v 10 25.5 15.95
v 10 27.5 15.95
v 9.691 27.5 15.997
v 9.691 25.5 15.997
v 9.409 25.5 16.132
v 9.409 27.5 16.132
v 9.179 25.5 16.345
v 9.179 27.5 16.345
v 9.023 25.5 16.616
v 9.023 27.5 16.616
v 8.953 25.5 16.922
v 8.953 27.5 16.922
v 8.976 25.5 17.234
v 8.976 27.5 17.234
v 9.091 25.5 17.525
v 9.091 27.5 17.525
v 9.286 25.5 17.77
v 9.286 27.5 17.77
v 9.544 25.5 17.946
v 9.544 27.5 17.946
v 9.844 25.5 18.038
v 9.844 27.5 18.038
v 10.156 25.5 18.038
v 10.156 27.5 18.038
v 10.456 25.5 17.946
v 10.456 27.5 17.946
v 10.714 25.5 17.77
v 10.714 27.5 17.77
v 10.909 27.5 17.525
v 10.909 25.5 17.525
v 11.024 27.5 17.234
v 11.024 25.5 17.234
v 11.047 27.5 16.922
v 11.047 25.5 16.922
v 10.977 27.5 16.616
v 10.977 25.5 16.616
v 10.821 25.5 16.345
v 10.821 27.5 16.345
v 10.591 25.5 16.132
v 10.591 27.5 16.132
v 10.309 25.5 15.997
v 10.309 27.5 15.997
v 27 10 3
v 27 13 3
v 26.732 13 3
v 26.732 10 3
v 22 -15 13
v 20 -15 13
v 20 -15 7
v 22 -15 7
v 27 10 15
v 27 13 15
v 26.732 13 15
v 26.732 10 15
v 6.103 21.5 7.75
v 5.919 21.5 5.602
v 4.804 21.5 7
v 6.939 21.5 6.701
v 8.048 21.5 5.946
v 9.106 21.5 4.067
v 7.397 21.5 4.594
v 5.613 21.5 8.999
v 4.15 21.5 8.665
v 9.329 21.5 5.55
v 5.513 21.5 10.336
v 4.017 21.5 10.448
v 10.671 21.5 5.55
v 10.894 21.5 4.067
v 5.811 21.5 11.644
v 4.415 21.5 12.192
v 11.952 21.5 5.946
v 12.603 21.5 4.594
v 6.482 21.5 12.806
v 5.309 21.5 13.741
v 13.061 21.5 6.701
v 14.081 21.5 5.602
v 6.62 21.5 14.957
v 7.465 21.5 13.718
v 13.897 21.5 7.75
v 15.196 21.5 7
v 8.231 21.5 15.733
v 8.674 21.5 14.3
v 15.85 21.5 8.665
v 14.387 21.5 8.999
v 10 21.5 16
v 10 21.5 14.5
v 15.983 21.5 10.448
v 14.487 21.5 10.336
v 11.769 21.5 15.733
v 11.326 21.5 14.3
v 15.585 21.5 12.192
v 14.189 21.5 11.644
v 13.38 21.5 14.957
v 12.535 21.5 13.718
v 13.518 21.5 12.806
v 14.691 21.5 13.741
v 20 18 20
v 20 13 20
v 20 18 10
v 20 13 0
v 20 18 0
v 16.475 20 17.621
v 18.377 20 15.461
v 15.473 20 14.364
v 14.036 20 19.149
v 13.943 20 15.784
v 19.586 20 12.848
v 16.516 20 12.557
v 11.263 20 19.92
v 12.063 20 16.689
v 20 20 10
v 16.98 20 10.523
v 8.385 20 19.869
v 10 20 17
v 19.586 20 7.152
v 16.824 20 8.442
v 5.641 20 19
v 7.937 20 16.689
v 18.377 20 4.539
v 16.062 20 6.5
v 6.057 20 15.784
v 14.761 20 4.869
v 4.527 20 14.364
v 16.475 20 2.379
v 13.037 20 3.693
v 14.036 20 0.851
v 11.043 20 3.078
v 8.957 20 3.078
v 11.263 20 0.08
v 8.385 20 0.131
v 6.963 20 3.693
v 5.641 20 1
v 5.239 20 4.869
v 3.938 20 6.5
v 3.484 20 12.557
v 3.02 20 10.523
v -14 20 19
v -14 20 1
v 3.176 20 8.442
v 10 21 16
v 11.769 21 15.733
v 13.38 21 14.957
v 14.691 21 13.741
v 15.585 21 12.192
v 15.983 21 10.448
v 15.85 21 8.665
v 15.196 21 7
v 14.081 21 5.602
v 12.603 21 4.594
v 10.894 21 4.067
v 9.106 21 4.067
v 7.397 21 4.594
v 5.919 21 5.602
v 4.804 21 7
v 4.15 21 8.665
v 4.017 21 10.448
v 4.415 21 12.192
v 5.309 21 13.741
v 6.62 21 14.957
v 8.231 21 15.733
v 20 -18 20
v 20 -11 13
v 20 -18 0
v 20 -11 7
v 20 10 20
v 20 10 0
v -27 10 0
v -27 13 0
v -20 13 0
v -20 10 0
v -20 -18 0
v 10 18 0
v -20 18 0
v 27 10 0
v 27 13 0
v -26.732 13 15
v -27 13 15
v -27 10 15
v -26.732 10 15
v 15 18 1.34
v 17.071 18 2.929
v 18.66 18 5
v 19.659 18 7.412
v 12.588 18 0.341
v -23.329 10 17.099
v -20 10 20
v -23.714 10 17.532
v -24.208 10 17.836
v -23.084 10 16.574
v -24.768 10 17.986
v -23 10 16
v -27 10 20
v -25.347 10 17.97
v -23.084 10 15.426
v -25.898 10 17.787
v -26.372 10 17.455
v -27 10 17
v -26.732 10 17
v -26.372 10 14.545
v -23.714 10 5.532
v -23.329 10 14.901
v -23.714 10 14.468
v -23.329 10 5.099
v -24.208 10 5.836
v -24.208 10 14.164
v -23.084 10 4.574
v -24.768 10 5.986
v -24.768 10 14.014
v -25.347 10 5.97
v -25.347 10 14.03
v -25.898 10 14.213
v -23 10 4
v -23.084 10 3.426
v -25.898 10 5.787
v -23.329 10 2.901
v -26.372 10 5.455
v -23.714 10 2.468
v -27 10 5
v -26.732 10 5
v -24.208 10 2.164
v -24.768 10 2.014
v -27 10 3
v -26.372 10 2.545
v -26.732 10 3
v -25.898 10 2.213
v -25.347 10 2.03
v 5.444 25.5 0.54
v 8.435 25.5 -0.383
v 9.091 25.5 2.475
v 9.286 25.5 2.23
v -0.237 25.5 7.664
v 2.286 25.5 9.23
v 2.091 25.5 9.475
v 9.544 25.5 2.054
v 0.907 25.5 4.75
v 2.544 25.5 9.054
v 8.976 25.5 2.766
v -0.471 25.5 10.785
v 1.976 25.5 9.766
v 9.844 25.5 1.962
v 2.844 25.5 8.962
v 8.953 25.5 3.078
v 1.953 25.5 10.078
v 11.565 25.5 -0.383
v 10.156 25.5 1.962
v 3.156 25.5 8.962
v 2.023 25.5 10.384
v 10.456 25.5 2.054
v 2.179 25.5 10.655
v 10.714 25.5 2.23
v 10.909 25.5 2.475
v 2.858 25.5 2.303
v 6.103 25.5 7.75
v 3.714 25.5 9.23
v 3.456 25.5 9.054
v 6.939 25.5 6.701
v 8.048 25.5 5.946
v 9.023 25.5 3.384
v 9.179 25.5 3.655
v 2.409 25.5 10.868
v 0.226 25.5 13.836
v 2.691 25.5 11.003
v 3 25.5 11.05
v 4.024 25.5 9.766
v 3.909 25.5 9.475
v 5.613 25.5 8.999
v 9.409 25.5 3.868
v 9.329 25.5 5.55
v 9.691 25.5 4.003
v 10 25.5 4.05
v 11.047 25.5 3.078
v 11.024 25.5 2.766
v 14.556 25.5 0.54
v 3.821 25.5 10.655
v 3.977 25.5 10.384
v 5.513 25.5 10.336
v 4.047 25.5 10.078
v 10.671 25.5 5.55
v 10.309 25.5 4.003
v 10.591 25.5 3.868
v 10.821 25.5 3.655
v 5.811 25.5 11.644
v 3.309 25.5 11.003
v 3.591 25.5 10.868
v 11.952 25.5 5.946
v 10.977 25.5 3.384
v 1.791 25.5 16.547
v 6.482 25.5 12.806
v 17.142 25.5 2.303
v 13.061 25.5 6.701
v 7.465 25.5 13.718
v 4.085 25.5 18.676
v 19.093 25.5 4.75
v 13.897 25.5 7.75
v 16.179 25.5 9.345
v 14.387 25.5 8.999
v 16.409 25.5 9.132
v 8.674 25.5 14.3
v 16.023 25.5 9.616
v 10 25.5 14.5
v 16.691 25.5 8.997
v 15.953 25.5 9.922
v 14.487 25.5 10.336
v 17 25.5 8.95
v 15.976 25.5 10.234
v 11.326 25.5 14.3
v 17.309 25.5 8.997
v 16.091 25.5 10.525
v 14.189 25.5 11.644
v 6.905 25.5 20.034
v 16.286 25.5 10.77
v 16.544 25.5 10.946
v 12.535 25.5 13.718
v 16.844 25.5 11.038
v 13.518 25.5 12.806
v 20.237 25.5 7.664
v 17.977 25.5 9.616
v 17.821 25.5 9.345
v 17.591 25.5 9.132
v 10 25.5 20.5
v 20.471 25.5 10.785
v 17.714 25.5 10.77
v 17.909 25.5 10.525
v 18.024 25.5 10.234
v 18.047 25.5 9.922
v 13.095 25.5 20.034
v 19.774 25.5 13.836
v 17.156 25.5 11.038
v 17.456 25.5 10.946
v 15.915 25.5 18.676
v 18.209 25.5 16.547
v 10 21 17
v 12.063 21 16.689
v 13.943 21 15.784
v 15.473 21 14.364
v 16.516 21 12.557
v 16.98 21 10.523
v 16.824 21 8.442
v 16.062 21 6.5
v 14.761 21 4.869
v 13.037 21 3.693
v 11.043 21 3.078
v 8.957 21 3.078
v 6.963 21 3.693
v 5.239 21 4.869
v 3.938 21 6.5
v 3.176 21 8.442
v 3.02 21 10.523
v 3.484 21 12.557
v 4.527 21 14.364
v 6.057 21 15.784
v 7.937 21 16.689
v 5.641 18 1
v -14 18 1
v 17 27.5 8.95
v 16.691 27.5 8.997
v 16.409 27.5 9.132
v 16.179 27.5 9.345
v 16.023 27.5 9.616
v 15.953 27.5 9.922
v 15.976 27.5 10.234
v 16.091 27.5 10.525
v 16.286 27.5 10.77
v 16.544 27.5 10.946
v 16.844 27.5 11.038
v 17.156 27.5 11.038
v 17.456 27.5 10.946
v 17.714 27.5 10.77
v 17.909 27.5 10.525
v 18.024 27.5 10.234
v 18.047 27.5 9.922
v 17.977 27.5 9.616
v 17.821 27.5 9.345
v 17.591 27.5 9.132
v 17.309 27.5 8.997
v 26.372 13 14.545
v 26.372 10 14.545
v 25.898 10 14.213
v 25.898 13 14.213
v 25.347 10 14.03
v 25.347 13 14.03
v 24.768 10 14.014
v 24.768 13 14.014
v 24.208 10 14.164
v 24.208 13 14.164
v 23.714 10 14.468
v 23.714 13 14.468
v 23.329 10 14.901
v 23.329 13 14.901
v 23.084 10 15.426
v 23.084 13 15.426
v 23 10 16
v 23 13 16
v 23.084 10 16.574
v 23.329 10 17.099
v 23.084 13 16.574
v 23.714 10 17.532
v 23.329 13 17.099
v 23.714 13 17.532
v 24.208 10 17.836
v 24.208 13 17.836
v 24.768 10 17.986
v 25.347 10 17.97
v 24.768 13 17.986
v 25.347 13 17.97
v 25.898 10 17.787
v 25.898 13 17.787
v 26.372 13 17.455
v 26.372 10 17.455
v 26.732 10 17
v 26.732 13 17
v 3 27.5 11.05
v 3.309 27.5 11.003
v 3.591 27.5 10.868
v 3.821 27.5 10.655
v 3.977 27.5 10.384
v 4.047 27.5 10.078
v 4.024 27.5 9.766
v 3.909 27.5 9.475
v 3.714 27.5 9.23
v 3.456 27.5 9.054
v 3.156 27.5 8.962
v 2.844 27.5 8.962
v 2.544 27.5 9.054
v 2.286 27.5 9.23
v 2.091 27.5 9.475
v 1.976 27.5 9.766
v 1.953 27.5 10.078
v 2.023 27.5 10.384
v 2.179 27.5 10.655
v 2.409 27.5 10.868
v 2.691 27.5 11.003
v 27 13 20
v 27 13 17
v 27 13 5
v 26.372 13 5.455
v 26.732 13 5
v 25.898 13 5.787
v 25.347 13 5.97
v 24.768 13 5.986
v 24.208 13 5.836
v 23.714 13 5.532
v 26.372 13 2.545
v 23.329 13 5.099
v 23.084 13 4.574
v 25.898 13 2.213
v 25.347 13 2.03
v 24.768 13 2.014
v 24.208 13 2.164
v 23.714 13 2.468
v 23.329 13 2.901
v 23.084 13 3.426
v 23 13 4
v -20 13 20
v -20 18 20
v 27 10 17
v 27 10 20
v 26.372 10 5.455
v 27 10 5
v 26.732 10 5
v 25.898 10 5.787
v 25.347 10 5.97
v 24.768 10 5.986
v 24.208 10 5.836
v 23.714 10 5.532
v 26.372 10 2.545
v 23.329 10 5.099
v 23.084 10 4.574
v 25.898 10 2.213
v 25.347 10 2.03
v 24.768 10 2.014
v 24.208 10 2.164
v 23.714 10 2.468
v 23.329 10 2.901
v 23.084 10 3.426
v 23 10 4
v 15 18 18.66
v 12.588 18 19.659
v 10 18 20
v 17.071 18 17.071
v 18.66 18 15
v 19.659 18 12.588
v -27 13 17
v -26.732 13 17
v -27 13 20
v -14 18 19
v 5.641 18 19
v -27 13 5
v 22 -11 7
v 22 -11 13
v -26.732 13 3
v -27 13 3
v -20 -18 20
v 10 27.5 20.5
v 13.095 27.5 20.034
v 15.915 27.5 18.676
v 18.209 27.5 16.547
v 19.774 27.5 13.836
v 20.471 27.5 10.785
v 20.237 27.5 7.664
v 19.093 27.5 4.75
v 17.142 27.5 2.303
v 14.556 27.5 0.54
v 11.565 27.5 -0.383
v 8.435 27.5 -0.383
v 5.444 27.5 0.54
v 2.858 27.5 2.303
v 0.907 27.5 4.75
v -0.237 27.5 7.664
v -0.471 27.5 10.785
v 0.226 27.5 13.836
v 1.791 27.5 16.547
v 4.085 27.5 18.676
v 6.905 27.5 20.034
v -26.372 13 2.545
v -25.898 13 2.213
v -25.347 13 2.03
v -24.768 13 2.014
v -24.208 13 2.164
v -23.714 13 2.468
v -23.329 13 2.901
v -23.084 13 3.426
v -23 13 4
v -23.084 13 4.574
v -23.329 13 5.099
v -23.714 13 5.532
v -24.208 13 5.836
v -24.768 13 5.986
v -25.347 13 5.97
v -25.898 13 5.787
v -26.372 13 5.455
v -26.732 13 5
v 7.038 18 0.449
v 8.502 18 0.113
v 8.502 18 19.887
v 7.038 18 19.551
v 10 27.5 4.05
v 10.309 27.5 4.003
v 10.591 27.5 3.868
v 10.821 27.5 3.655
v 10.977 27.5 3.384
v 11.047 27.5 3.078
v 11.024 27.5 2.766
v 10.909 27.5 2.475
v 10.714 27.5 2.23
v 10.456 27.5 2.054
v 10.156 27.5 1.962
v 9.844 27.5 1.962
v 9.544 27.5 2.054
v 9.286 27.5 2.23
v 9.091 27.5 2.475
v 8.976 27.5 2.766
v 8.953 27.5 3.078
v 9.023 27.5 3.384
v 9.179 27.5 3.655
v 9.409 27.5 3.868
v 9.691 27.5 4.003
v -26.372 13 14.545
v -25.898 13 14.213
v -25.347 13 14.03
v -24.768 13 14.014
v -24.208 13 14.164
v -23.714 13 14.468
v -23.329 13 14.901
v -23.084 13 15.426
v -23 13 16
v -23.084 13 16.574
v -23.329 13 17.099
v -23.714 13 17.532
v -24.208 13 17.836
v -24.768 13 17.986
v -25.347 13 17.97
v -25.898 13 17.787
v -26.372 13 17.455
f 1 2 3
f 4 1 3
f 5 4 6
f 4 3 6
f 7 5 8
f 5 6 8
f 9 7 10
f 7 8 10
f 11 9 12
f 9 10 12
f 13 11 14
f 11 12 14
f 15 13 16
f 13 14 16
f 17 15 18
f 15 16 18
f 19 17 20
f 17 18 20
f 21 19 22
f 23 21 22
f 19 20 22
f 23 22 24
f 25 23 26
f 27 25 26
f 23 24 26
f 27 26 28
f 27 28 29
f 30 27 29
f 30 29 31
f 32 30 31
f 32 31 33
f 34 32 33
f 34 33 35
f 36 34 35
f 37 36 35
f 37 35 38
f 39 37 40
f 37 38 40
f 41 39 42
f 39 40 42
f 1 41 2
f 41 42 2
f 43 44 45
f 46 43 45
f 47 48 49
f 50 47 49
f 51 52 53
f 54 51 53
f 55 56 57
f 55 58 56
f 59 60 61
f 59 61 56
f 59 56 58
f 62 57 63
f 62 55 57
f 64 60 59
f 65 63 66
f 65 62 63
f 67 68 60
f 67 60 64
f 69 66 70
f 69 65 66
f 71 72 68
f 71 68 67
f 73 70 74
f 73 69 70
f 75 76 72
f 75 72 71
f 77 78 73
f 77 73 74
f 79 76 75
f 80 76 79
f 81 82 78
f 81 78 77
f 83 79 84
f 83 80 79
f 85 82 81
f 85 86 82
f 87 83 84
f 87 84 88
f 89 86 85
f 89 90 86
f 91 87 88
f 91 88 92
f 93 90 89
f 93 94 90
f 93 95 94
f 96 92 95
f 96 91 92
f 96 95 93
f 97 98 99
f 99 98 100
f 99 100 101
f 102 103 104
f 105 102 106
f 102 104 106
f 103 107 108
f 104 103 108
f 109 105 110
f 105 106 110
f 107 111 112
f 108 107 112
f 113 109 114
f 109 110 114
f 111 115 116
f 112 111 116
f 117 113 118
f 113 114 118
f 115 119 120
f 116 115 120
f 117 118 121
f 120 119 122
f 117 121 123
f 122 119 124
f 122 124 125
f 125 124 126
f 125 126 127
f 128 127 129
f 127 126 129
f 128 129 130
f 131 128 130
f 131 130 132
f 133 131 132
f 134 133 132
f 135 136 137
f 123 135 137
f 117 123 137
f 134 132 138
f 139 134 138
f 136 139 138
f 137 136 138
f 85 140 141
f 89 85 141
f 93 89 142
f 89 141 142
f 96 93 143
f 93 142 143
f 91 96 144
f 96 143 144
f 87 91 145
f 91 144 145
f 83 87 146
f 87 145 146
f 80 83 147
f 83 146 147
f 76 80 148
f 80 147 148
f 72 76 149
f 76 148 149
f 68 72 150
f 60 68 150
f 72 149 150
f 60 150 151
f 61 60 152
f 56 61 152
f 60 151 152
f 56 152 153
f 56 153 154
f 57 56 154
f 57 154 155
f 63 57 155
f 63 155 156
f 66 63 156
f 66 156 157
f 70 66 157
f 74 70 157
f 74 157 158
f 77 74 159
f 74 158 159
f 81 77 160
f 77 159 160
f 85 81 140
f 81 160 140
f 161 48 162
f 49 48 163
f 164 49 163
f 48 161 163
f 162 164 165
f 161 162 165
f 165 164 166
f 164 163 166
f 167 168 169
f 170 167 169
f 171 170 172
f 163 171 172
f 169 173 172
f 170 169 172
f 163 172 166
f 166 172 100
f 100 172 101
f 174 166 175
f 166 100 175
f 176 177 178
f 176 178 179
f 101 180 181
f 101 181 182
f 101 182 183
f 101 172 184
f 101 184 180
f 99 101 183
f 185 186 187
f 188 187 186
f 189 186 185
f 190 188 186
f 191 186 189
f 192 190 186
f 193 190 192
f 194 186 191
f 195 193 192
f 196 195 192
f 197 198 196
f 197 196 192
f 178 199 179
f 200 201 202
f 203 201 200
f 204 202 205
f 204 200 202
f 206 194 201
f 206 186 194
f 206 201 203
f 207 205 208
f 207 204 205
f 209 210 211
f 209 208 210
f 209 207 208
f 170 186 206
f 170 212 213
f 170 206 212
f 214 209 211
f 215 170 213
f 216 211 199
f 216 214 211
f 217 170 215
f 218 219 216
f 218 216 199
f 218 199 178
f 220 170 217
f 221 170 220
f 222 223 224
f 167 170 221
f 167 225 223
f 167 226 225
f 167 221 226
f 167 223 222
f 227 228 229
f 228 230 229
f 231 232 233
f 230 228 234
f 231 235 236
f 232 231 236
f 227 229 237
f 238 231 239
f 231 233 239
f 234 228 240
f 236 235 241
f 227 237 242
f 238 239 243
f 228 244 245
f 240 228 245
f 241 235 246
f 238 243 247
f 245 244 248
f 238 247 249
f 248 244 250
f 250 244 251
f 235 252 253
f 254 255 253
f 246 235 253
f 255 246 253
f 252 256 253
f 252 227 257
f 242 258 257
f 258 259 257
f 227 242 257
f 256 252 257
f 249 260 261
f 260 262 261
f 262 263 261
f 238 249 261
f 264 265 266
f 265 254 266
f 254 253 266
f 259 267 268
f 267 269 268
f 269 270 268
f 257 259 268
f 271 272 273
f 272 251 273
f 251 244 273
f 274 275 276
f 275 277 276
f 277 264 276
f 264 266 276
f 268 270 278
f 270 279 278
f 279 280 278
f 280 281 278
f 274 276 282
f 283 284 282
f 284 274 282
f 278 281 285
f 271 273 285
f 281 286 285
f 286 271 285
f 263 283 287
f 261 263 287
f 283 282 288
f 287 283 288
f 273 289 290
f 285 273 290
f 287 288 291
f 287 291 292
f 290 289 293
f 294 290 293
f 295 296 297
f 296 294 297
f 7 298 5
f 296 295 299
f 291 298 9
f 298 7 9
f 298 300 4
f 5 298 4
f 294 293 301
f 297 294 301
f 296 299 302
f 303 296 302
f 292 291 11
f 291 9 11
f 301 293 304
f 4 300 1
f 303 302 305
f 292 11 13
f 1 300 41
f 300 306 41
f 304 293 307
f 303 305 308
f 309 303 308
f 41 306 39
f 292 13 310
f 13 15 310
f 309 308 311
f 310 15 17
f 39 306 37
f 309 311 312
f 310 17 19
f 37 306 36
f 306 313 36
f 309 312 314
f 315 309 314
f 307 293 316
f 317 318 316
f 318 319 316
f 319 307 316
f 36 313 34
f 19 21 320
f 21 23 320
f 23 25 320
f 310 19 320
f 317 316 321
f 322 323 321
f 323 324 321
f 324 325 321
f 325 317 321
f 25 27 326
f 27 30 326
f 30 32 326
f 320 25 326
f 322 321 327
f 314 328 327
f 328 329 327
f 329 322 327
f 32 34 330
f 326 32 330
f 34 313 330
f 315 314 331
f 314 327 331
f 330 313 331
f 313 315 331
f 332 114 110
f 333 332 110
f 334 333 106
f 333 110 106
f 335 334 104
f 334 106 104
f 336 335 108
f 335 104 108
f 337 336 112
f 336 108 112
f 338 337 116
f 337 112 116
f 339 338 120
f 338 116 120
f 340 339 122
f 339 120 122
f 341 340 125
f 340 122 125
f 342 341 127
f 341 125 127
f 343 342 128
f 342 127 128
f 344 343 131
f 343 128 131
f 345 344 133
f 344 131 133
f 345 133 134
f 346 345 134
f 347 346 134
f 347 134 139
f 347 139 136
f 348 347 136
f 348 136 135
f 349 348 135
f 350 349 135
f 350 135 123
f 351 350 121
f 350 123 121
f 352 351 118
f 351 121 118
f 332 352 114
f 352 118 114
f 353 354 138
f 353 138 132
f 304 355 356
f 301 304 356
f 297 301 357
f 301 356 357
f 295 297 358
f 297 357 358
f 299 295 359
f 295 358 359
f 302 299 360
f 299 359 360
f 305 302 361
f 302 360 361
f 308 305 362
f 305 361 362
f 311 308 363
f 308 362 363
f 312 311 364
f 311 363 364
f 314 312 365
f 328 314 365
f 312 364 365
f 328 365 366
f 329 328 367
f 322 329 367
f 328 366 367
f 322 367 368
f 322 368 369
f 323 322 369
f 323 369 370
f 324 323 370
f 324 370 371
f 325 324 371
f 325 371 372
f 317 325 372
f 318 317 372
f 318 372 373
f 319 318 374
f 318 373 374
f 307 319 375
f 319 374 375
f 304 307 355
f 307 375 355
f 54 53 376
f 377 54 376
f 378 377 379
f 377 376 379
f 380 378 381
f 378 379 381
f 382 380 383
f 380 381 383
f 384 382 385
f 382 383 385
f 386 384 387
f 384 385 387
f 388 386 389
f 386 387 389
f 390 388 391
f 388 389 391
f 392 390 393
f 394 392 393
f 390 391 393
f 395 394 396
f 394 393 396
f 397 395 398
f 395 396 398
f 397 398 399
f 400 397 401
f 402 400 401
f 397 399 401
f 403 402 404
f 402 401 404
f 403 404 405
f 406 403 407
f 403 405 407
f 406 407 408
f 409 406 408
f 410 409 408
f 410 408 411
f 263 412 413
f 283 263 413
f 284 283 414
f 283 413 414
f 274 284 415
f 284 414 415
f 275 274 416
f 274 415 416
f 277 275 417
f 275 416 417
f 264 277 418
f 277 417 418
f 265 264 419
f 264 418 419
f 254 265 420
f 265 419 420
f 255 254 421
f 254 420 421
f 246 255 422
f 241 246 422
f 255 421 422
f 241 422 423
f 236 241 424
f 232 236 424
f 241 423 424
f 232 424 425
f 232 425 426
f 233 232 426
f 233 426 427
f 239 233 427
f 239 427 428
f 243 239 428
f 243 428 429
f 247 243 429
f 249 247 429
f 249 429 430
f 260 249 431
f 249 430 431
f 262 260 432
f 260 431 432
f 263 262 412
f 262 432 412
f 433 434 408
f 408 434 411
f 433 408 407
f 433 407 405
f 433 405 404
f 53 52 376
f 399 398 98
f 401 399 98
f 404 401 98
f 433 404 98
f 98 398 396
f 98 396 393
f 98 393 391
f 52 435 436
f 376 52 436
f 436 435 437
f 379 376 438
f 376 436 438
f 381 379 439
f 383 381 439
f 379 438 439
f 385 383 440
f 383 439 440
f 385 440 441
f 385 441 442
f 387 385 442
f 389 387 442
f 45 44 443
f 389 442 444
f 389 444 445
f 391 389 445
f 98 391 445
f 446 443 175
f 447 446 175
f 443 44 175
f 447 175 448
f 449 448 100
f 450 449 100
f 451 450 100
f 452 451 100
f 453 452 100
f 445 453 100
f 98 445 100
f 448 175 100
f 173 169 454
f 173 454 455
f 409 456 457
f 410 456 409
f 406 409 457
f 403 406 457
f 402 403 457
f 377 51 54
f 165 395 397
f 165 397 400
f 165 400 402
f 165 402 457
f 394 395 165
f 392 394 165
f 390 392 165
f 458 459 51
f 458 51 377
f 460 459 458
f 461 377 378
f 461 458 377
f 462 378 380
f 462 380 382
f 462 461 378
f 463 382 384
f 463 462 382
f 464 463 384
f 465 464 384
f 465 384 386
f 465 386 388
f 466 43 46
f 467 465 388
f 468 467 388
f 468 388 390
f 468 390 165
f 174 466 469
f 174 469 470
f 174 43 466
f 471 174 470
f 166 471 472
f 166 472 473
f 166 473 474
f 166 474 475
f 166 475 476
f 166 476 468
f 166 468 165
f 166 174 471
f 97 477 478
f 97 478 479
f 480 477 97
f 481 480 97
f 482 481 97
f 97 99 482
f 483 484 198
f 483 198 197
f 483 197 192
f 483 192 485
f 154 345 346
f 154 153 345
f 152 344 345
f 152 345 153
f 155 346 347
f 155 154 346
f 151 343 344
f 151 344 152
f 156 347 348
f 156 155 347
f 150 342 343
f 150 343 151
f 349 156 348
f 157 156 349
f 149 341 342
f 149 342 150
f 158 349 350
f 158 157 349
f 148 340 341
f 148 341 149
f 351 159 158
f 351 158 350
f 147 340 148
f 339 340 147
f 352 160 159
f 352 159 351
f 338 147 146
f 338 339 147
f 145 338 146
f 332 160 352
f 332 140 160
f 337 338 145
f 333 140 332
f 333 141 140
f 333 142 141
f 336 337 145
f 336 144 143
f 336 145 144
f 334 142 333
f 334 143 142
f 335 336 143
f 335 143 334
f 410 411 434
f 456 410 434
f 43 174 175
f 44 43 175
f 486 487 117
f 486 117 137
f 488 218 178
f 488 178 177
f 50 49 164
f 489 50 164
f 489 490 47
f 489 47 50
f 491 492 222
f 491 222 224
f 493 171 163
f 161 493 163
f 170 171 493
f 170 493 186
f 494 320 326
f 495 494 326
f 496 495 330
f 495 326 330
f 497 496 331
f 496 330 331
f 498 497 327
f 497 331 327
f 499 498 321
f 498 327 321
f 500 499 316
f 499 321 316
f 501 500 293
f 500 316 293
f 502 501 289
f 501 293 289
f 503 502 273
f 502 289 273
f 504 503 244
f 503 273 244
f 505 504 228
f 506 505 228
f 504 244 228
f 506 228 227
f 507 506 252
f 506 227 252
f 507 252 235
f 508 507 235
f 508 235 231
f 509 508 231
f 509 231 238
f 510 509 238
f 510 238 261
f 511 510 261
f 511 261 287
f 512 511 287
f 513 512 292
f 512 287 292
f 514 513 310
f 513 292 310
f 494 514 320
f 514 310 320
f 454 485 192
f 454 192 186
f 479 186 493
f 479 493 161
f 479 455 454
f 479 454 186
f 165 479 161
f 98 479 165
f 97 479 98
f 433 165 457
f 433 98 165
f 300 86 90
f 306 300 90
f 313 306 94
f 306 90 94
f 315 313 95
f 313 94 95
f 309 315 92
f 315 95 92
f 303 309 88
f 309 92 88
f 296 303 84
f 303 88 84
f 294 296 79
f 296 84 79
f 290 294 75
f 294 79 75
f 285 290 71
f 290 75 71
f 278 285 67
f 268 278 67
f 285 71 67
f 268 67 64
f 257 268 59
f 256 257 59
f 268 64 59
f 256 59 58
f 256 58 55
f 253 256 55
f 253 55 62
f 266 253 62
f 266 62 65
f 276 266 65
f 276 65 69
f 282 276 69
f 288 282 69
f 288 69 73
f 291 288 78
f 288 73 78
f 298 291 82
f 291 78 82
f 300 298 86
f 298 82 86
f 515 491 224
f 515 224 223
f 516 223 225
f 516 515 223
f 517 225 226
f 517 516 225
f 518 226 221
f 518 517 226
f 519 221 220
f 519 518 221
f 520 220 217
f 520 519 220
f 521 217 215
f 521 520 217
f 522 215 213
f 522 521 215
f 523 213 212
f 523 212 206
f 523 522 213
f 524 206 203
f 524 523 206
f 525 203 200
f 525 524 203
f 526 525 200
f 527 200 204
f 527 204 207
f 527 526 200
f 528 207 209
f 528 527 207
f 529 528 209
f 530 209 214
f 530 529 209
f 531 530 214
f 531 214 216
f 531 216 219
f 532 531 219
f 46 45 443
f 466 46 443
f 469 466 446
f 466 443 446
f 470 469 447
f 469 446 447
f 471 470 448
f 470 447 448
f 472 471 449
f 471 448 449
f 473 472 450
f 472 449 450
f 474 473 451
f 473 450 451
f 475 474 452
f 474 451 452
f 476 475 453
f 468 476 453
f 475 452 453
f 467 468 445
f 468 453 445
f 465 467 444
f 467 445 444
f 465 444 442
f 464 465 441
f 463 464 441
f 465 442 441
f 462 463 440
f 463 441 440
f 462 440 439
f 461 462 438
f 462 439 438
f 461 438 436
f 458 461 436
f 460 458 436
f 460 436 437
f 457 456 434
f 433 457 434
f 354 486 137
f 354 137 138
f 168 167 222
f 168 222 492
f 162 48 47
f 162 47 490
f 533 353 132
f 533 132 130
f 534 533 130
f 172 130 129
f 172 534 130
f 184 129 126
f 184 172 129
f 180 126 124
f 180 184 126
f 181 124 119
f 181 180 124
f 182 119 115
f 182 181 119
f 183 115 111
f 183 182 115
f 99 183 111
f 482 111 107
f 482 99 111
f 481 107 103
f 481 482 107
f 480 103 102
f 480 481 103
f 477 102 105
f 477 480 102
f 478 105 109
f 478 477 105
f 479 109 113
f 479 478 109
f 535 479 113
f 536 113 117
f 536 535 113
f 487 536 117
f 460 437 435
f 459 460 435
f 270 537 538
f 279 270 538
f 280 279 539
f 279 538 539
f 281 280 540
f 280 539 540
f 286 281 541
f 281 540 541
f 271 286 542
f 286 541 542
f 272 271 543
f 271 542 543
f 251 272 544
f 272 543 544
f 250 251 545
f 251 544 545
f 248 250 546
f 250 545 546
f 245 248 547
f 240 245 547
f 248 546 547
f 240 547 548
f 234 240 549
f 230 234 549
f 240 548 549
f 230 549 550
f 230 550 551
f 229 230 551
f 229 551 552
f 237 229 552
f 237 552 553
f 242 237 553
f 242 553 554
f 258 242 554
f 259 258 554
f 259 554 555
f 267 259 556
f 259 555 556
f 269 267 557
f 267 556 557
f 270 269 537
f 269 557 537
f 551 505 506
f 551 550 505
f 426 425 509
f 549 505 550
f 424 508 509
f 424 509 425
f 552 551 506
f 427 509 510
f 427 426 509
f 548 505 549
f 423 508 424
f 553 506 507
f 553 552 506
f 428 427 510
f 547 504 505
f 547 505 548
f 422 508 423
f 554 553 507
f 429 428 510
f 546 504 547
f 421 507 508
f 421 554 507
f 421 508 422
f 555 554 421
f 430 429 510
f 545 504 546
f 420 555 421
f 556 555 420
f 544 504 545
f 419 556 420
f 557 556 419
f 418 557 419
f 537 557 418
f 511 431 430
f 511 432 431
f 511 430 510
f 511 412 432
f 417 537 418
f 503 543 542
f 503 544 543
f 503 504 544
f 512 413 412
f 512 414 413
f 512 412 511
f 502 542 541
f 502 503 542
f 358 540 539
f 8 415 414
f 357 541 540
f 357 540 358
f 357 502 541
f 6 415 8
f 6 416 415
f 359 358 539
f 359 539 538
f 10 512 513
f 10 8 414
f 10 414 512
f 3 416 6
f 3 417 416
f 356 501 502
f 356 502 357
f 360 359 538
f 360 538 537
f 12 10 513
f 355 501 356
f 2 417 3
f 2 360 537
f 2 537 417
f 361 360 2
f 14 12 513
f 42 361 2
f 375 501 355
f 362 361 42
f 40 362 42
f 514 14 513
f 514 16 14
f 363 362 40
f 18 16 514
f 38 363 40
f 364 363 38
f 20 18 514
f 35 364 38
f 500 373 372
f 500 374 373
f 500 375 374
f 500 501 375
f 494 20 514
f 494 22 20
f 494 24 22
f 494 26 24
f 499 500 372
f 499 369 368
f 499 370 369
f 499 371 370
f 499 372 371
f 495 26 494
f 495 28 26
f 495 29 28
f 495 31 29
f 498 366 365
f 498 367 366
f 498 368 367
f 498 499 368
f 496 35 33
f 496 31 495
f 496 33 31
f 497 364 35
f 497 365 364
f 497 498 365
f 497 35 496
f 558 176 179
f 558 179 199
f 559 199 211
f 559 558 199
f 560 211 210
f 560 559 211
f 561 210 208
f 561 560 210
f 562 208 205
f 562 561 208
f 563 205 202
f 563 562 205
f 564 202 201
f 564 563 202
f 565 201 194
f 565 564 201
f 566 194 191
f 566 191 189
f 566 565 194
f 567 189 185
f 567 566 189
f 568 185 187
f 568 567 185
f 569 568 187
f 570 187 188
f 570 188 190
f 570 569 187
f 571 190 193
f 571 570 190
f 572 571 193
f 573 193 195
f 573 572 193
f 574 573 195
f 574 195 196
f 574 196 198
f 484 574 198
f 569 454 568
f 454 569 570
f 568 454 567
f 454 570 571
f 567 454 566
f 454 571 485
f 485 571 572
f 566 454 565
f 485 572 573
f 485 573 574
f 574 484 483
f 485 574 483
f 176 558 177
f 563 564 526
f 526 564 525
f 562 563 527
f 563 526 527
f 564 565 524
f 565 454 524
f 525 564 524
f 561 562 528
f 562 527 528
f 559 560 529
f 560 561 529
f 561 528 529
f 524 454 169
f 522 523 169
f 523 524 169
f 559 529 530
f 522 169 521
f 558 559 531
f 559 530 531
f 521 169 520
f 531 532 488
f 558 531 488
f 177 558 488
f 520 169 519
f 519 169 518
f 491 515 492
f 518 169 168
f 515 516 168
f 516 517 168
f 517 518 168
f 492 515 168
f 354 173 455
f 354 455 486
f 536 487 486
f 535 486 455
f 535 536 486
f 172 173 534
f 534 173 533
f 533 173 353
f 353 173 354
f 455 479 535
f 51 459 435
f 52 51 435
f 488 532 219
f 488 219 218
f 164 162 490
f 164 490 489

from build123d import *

# Parameters (mm, degrees)
SKETCH1_W           = 40
SKETCH1_H           = 36
BOSS_EXTRUDE1_DEPTH = 20
BOSS_EXTRUDE3_DEPTH = 2
SKETCH4_R           = 7
BOSS_EXTRUDE4_DEPTH = 1
SKETCH5_R           = 6
BOSS_EXTRUDE5_DEPTH = 0.5
SKETCH8_R           = 4.5
BOSS_EXTRUDE6_DEPTH = 4
SKETCH9_R           = 10.5
BOSS_EXTRUDE7_DEPTH = 2
SKETCH13_W          = 7
SKETCH13_H          = 3
BOSS_EXTRUDE8_DEPTH = 20
CUT_EXTRUDE1_DEPTH  = 3
SKETCH17_W          = 6
SKETCH17_H          = 4
BOSS_EXTRUDE9_DEPTH = 2
SKETCH19_R          = 1.05
CUT_EXTRUDE2_DEPTH  = 2


with BuildPart() as part:
    # Sketch1 → Boss-Extrude1 (new body)
    with BuildSketch(Plane.XY):
        Rectangle(SKETCH1_W, SKETCH1_H)
    extrude(amount=BOSS_EXTRUDE1_DEPTH)

    # Sketch2 → Boss-Extrude3 (add)
    with BuildSketch(Plane(origin=(0, 18, 0), x_dir=(1, 0, 0), z_dir=(0, 1, 0))):
        with BuildLine():
            Line((-14, -1), (5.641101056, -1))
            ThreePointArc((5.641101056, -1), (20, -10), (5.641101056, -19))
            Line((5.641101056, -19), (-14, -19))
            Line((-14, -19), (-14, -1))
        make_face()
    extrude(amount=BOSS_EXTRUDE3_DEPTH)

    # Sketch4 → Boss-Extrude4 (add)
    with BuildSketch(Plane(origin=(0, 20, 0), x_dir=(1, 0, 0), z_dir=(0, 1, 0))):
        with Locations(Location((10, -10, 0), (0, 0, 270))):
            Circle(SKETCH4_R)
    extrude(amount=BOSS_EXTRUDE4_DEPTH)

    # Sketch5 → Boss-Extrude5 (add)
    with BuildSketch(Plane(origin=(0, 21, 0), x_dir=(1, 0, 0), z_dir=(0, 1, 0))):
        with Locations(Location((10, -10, 0), (0, 0, 270))):
            Circle(SKETCH5_R)
    extrude(amount=BOSS_EXTRUDE5_DEPTH)

    # Sketch8 → Boss-Extrude6 (add)
    with BuildSketch(Plane(origin=(0, 21.5, 0), x_dir=(1, 0, 0), z_dir=(0, 1, 0))):
        with Locations(Location((10, -10, 0), (0, 0, 270))):
            Circle(SKETCH8_R)
    extrude(amount=BOSS_EXTRUDE6_DEPTH)

    # Sketch9 → Boss-Extrude7 (add)
    with BuildSketch(Plane(origin=(0, 25.5, 0), x_dir=(1, 0, 0), z_dir=(0, 1, 0))):
        with Locations(Location((10, -10, 0), (0, 0, 270))):
            Circle(SKETCH9_R)
    extrude(amount=BOSS_EXTRUDE7_DEPTH)

    # Sketch13 → Boss-Extrude8 (add)
    with BuildSketch(Plane(origin=(0, 0, 0), x_dir=(-1, 0, 0), z_dir=(0, 0, -1))):
        with Locations((23.5, 11.5)):
            Rectangle(SKETCH13_W, SKETCH13_H)
        with Locations((-23.5, 11.5)):
            Rectangle(SKETCH13_W, SKETCH13_H)
    extrude(amount=-BOSS_EXTRUDE8_DEPTH)

    # Sketch14 → Cut-Extrude1 (cut)
    with BuildSketch(Plane(origin=(0, 13, 0), x_dir=(1, 0, 0), z_dir=(0, 1, 0))):
        with BuildLine():
            Line((-27, -17), (-27, -15))
            Line((-27, -15), (-26.732050808, -15))
            ThreePointArc((-26.732050808, -15), (-23, -16), (-26.732050808, -17))
            Line((-26.732050808, -17), (-27, -17))
        make_face()
        with BuildLine():
            Line((-27, -3), (-26.732050808, -3))
            ThreePointArc((-26.732050808, -3), (-23, -4), (-26.732050808, -5))
            Line((-26.732050808, -5), (-27, -5))
            Line((-27, -5), (-27, -3))
        make_face()
    cut_extrude1 = extrude(amount=-CUT_EXTRUDE1_DEPTH, mode=Mode.SUBTRACT)

    # Mirror2: Cut-Extrude1 across plane
    add(cut_extrude1.mirror(Plane(origin=(0, 0, 0), x_dir=(0, 0, 1), z_dir=(1, 0, 0))), mode=Mode.SUBTRACT)

    # Sketch17 → Boss-Extrude9 (add)
    with BuildSketch(Plane(origin=(20, 0, 0), x_dir=(0, 0, -1), z_dir=(1, 0, 0))):
        with Locations((-10, -13)):
            Rectangle(SKETCH17_W, SKETCH17_H)
    extrude(amount=BOSS_EXTRUDE9_DEPTH)

    # Sketch19 → Cut-Extrude2 (cut)
    with BuildSketch(Plane(origin=(0, 27.5, 0), x_dir=(1, 0, 0), z_dir=(0, 1, 0))):
        with Locations(Location((10, -3, 0), (0, 0, 270))):
            Circle(SKETCH19_R)
        with Locations(Location((3, -10, 0), (0, 0, 270))):
            Circle(SKETCH19_R)
        with Locations(Location((10, -17, 0), (0, 0, 90))):
            Circle(SKETCH19_R)
        with Locations(Location((17, -10, 0), (0, 0, 90))):
            Circle(SKETCH19_R)
    extrude(amount=-CUT_EXTRUDE2_DEPTH, mode=Mode.SUBTRACT)


solid = part.part
